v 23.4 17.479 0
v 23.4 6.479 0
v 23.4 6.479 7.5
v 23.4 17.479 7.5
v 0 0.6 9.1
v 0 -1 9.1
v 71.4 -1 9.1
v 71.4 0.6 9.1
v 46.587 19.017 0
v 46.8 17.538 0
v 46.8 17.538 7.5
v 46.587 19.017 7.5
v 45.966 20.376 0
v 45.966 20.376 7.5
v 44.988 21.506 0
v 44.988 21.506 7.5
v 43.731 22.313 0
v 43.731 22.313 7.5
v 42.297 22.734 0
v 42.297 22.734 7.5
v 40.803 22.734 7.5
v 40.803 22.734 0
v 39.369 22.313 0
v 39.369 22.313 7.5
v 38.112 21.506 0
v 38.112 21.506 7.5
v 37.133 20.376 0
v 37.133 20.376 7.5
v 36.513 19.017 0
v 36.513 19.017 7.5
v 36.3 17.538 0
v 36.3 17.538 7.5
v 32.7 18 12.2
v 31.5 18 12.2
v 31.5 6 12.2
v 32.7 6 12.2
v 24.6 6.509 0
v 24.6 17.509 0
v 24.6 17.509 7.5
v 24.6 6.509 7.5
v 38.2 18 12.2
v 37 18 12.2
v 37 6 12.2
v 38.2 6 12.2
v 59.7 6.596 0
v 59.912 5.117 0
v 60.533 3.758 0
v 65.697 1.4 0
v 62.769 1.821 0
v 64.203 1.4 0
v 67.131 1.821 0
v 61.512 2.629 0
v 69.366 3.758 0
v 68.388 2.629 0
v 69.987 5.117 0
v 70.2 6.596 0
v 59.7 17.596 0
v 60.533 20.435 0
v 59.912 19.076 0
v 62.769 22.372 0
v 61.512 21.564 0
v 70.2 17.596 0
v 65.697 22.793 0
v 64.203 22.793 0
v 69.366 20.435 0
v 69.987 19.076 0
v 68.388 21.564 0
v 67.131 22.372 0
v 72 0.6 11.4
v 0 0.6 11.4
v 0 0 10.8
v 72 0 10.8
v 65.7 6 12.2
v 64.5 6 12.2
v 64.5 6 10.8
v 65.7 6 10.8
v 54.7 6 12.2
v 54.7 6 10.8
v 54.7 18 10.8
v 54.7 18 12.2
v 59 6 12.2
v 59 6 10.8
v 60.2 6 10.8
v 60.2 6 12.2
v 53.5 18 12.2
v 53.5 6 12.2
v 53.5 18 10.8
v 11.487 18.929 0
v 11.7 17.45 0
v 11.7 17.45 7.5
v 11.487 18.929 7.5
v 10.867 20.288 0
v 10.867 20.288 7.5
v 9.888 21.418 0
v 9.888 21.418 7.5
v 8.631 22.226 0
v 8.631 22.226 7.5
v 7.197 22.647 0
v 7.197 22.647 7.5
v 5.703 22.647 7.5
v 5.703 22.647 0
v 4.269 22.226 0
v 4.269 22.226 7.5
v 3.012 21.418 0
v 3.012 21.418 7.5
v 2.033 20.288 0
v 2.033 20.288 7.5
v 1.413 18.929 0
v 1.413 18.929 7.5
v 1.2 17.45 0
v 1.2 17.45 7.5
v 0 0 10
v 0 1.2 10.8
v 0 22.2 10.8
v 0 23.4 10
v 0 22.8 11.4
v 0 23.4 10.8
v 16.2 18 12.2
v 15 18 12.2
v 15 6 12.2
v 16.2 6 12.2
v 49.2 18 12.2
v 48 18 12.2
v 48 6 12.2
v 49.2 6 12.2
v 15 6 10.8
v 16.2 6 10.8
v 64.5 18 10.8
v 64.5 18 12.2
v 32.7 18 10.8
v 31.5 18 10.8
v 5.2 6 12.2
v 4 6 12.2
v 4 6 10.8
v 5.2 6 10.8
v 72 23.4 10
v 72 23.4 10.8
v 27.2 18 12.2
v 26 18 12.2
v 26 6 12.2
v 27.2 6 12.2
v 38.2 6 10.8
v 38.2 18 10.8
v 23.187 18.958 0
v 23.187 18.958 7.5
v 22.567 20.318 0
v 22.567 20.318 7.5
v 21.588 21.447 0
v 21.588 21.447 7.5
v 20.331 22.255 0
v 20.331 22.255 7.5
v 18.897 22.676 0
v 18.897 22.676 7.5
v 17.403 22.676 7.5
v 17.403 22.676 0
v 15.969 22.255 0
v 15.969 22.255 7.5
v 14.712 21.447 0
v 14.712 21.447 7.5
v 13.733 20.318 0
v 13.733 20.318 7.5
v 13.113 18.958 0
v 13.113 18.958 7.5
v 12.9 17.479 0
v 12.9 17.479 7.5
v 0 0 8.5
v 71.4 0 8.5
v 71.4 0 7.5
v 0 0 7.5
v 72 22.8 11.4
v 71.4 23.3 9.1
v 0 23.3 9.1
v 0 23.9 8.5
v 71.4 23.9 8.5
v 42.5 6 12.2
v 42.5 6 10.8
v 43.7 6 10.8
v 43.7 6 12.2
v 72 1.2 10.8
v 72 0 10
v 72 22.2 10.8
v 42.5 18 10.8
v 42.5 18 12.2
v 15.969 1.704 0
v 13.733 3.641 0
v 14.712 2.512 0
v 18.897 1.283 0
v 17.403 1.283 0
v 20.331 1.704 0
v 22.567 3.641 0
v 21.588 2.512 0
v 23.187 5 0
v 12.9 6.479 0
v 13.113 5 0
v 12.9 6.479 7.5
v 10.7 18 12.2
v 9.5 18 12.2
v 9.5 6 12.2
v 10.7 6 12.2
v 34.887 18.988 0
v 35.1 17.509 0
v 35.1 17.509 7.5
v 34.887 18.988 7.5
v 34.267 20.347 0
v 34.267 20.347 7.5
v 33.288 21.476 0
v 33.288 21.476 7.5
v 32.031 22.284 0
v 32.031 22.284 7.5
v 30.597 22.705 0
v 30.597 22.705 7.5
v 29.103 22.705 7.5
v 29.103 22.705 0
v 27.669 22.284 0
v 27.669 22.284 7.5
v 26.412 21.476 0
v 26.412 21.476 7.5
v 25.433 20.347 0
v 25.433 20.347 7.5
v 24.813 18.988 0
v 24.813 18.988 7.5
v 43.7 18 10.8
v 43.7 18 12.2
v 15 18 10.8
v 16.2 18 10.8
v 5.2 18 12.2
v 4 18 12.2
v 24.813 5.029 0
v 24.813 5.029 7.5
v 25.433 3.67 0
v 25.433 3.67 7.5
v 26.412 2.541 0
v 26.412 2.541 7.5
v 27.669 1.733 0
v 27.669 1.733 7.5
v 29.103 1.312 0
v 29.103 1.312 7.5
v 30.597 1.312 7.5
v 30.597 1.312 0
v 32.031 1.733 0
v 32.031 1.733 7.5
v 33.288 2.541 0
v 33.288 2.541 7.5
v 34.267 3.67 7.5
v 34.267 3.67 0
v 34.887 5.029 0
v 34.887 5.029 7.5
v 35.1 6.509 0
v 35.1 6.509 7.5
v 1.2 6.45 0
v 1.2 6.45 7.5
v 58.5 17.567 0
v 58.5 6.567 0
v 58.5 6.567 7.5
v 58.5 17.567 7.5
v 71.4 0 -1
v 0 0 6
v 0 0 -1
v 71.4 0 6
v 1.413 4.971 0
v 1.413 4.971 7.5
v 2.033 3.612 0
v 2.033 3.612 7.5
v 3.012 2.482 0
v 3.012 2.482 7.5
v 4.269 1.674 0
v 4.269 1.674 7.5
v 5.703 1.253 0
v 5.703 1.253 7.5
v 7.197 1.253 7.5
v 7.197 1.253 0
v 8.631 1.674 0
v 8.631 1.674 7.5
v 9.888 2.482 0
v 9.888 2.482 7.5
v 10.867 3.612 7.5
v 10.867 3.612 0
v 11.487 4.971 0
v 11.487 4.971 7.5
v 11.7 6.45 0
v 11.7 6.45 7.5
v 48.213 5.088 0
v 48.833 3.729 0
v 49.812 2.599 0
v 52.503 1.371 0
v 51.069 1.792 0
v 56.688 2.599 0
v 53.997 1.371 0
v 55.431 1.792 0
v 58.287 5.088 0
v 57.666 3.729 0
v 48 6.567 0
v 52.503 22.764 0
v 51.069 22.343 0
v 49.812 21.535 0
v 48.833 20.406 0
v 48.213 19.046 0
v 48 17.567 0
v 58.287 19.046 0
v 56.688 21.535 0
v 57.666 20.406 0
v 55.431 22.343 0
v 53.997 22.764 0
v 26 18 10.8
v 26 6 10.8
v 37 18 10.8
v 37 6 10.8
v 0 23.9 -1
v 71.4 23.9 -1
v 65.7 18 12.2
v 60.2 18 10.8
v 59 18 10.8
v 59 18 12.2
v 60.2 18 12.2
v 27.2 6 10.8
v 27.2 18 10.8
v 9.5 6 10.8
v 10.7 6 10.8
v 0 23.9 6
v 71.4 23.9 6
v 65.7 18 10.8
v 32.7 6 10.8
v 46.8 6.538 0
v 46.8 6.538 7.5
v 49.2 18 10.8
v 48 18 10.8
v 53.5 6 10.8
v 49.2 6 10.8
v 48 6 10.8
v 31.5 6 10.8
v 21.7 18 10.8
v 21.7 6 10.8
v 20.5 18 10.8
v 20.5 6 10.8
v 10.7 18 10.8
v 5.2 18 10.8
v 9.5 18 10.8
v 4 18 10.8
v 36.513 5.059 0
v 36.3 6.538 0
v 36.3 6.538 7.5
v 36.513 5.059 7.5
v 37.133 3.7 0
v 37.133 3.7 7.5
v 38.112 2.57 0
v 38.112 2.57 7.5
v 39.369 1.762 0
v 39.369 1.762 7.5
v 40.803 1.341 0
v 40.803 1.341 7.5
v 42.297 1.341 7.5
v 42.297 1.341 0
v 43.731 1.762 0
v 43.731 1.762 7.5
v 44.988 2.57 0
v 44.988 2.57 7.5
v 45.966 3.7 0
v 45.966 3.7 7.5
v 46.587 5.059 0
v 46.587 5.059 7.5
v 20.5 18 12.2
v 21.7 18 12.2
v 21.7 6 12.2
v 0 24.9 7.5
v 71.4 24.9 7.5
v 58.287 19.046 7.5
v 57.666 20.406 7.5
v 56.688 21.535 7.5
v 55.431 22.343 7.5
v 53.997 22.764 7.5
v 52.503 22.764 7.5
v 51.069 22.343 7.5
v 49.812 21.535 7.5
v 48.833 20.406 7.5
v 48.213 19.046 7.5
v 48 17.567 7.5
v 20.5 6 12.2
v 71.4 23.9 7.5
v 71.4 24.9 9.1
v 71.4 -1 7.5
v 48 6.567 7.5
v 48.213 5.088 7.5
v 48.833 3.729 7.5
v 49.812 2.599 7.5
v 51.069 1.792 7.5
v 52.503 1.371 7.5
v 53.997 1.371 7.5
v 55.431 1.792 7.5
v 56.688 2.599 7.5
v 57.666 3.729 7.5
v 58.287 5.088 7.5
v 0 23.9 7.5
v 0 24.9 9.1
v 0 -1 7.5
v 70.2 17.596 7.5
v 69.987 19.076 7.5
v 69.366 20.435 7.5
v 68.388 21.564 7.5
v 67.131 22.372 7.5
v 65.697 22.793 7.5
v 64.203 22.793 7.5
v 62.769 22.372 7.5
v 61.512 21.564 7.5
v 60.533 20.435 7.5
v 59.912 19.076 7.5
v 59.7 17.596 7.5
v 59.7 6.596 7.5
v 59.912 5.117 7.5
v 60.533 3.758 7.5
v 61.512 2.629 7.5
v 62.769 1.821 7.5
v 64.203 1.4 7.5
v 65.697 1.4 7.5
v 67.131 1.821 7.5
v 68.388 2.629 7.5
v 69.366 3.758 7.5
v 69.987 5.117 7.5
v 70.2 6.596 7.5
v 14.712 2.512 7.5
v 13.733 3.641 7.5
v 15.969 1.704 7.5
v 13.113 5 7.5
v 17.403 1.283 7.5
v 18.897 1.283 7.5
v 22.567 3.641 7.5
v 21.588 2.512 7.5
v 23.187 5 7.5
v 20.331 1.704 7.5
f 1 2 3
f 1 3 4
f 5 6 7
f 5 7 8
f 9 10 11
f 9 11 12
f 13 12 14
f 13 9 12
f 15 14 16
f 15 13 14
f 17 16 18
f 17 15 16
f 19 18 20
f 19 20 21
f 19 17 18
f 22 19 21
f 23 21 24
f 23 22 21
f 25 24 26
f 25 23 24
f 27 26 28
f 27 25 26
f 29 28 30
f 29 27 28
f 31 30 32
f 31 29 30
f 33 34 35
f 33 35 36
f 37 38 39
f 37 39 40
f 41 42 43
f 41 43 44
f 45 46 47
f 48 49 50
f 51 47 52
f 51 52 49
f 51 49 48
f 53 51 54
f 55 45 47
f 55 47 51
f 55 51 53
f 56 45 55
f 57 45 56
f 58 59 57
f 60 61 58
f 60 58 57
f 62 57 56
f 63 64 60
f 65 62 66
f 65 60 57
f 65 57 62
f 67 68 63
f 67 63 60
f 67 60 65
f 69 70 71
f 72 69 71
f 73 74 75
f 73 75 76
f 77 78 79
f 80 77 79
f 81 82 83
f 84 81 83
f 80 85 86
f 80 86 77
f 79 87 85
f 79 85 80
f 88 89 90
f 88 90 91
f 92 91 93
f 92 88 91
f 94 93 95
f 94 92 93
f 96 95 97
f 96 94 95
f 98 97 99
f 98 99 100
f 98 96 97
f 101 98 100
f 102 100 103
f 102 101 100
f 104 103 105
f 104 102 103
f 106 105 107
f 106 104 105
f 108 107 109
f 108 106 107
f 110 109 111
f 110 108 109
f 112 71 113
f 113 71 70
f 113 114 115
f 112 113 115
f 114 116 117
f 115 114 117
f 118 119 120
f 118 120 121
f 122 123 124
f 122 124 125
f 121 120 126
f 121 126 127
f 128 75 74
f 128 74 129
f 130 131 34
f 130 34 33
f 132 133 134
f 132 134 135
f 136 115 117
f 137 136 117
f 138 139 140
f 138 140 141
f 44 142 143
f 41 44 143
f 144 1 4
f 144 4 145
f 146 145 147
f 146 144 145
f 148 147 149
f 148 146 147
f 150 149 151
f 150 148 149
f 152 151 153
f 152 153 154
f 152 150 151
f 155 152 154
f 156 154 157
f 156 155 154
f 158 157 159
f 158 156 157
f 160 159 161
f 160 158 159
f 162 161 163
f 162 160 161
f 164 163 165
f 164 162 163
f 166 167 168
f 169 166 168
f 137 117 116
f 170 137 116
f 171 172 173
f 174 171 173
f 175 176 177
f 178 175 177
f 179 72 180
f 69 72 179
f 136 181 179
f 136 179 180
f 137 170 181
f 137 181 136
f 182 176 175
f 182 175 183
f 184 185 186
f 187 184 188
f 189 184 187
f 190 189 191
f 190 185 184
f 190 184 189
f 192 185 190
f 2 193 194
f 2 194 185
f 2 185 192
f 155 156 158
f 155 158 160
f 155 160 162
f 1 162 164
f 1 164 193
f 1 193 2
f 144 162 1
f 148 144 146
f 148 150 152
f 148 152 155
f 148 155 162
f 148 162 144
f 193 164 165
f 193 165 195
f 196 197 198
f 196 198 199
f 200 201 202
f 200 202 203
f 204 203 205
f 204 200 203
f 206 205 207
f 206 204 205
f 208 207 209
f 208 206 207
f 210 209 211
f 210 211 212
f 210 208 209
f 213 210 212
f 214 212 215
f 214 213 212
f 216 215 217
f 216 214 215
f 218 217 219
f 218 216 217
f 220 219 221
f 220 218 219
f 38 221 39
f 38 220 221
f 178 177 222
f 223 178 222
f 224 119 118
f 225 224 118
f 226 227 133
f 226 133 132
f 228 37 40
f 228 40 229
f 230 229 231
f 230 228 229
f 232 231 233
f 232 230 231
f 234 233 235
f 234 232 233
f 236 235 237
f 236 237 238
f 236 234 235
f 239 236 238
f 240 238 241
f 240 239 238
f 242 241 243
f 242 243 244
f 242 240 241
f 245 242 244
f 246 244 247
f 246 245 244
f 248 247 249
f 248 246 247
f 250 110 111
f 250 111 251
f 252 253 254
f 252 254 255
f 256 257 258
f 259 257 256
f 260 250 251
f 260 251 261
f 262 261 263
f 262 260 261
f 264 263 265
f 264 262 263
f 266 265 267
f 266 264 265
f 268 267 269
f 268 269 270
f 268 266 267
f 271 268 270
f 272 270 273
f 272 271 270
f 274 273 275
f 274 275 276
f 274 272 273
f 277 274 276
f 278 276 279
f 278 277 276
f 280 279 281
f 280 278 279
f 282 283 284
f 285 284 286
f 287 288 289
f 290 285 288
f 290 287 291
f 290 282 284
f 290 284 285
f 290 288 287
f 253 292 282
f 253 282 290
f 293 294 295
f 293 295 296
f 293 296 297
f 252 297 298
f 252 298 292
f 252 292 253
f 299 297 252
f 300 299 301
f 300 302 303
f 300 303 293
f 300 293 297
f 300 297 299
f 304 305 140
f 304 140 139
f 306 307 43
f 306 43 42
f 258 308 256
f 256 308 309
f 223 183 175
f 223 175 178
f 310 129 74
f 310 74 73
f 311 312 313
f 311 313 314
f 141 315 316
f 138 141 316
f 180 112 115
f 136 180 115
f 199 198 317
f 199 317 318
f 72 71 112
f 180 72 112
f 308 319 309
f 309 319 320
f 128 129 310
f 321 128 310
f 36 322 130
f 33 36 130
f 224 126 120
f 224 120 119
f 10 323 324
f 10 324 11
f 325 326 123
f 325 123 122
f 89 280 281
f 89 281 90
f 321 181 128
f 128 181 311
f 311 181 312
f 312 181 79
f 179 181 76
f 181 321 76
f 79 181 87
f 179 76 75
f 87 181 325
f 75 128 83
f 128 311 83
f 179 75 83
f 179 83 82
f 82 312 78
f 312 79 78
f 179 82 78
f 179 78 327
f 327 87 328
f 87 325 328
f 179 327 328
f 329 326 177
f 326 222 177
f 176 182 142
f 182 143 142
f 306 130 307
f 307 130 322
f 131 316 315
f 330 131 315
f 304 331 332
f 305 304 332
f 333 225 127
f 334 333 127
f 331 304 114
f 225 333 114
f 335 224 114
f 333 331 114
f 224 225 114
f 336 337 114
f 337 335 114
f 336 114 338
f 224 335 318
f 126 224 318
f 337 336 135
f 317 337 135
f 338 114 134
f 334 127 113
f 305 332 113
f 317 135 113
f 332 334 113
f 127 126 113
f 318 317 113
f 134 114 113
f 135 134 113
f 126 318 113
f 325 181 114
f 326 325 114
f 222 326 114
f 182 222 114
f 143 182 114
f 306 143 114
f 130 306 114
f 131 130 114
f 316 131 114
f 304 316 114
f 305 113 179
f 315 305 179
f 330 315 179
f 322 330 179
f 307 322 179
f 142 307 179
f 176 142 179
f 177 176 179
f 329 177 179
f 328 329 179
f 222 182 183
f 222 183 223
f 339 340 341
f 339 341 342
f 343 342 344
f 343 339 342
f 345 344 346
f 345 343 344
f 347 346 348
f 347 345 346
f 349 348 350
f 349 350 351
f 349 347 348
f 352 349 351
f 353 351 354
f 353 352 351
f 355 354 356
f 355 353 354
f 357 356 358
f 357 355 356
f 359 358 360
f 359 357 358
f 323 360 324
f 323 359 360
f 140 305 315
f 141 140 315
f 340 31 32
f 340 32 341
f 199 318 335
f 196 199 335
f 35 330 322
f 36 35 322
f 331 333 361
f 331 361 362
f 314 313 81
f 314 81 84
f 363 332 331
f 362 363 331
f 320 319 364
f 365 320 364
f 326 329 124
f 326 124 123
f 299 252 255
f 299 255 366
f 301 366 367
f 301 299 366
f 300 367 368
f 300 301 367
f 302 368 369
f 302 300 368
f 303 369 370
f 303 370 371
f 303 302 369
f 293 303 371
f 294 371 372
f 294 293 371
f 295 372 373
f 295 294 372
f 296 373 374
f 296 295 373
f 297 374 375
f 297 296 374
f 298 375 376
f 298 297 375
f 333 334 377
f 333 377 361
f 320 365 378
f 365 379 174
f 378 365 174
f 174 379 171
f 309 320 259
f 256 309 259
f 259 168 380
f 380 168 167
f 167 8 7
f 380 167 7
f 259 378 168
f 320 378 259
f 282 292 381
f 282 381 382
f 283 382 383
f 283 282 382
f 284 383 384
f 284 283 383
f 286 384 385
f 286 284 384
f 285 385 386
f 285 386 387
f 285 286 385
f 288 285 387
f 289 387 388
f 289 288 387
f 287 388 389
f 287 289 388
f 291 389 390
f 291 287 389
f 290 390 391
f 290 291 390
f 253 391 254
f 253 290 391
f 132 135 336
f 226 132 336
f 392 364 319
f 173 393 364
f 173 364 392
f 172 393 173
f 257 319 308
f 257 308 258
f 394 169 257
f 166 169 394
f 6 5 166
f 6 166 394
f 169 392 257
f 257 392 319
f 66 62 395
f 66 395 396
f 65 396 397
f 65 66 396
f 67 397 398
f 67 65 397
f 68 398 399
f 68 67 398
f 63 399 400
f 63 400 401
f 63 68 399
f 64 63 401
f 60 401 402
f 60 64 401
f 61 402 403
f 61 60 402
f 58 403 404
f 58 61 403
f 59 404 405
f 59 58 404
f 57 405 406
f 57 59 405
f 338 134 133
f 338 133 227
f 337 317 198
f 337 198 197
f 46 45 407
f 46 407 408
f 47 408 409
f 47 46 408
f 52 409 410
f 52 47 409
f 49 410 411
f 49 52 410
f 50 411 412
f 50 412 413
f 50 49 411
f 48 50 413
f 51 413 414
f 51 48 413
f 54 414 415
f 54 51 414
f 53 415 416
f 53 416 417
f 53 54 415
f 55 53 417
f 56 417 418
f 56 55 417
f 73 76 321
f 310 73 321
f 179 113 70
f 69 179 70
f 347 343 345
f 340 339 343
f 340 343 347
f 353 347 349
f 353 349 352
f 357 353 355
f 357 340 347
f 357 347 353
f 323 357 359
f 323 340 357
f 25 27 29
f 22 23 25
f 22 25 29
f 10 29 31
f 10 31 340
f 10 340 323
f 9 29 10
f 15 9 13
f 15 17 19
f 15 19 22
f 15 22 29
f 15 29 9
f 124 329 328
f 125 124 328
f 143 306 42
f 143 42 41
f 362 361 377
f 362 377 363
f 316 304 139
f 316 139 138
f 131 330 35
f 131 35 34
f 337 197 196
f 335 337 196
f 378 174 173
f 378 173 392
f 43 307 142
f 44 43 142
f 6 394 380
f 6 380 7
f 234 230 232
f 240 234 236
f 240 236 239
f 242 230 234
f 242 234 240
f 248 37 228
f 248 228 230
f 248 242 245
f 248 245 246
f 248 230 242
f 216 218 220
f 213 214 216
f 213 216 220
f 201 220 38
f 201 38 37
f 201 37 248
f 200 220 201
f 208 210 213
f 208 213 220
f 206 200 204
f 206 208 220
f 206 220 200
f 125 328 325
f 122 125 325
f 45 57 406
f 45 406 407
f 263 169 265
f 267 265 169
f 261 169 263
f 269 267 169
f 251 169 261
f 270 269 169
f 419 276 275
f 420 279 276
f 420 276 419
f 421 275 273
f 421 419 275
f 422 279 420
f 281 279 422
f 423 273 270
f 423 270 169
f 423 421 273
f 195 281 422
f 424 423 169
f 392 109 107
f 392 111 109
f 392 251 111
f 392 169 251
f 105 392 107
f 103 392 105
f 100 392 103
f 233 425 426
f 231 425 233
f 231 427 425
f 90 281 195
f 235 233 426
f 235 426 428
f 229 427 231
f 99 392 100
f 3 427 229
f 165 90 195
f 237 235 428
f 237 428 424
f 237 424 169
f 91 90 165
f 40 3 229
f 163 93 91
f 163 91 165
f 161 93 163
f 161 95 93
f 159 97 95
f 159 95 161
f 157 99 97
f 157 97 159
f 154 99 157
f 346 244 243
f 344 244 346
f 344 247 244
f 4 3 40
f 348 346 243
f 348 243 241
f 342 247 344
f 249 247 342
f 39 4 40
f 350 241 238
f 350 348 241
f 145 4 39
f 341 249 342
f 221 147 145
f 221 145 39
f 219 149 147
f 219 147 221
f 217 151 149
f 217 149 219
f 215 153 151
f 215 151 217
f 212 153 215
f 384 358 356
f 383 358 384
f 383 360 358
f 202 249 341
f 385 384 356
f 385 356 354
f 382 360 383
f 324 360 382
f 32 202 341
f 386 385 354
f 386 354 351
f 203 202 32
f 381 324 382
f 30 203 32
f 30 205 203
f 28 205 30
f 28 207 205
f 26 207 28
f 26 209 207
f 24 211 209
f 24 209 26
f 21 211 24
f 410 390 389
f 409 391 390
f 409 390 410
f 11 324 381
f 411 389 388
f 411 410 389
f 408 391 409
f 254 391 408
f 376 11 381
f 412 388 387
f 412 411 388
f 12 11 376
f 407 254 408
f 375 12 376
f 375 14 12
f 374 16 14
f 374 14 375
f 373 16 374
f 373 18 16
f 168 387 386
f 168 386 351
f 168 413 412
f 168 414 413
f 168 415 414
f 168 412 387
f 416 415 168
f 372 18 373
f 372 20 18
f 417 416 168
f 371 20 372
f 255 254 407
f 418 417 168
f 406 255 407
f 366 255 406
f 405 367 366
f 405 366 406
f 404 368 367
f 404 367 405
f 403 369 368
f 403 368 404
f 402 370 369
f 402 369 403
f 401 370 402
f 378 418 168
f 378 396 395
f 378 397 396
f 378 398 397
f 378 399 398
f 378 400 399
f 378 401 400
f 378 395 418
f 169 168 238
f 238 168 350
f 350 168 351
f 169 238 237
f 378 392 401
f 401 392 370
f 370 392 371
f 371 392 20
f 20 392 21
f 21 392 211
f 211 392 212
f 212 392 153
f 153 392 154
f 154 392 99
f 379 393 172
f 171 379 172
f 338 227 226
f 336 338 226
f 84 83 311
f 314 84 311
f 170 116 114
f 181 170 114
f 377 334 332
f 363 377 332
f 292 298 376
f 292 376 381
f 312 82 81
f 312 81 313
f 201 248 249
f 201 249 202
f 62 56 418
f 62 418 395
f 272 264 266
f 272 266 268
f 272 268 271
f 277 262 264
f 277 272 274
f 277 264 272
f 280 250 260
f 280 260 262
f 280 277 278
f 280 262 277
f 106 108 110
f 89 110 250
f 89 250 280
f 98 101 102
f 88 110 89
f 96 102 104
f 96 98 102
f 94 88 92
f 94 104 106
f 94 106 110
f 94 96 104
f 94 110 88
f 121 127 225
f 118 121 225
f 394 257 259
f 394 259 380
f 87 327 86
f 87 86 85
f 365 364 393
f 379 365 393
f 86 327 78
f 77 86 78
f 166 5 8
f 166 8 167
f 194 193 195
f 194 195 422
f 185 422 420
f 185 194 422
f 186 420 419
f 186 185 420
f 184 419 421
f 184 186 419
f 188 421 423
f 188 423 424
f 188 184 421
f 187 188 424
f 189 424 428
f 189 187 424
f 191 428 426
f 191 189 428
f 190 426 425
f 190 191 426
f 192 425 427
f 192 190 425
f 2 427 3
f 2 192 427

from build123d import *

# Parameters (mm, degrees)
SKETCH_W     = 71.4
SKETCH_H     = 23.9
PAD_DEPTH    = 7.5
SKETCH001_W  = 71.4
SKETCH001_H  = 23.9
PAD001_DEPTH = 1
PAD002_DEPTH = 71.4
PAD003_DEPTH = 72
SKETCH004_W  = 1.2
SKETCH004_H  = 12
PAD004_DEPTH = 1.4


with BuildPart() as tarto:
    # Sketch → Pad (new body)
    with BuildSketch(Plane.XY):
        with Locations((35.7, 11.95)):
            Rectangle(SKETCH_W, SKETCH_H)
        with BuildLine():
            ThreePointArc((11.7, 17.45), (6.45, 22.7), (1.2, 17.45))
            Line((1.2, 17.45), (1.2, 6.45))
            ThreePointArc((1.2, 6.45), (6.45, 1.2), (11.7, 6.45))
            Line((11.7, 6.45), (11.7, 17.45))
        make_face(mode=Mode.SUBTRACT)
        with BuildLine():
            ThreePointArc((23.399963, 17.479296), (18.149963, 22.729296), (12.899963, 17.479296))
            Line((12.899963, 17.479296), (12.899963, 6.479296))
            ThreePointArc((12.899963, 6.479296), (18.149963, 1.229296), (23.399963, 6.479296))
            Line((23.399963, 6.479296), (23.399963, 17.479296))
        make_face(mode=Mode.SUBTRACT)
        with BuildLine():
            ThreePointArc((35.099927, 17.508591), (29.849927, 22.758591), (24.599927, 17.508591))
            Line((24.599927, 17.508591), (24.599927, 6.508591))
            ThreePointArc((24.599927, 6.508591), (29.849927, 1.258591), (35.099927, 6.508591))
            Line((35.099927, 6.508591), (35.099927, 17.508591))
        make_face(mode=Mode.SUBTRACT)
        with BuildLine():
            ThreePointArc((46.79989, 17.537887), (41.54989, 22.787887), (36.29989, 17.537887))
            Line((36.29989, 17.537887), (36.29989, 6.537887))
            ThreePointArc((36.29989, 6.537887), (41.54989, 1.287887), (46.79989, 6.537887))
            Line((46.79989, 6.537887), (46.79989, 17.537887))
        make_face(mode=Mode.SUBTRACT)
        with BuildLine():
            ThreePointArc((58.499853, 17.567183), (53.249853, 22.817183), (47.999853, 17.567183))
            Line((47.999853, 17.567183), (47.999853, 6.567183))
            ThreePointArc((47.999853, 6.567183), (53.249853, 1.317183), (58.499853, 6.567183))
            Line((58.499853, 6.567183), (58.499853, 17.567183))
        make_face(mode=Mode.SUBTRACT)
        with BuildLine():
            ThreePointArc((70.199817, 17.596479), (64.949817, 22.846479), (59.699817, 17.596479))
            Line((59.699817, 17.596479), (59.699817, 6.596479))
            ThreePointArc((59.699817, 6.596479), (64.949817, 1.346479), (70.199817, 6.596479))
            Line((70.199817, 6.596479), (70.199817, 17.596479))
        make_face(mode=Mode.SUBTRACT)
    extrude(amount=PAD_DEPTH)

    # Sketch001 → Pad001 (join)
    with BuildSketch(Plane.XY):
        with Locations((35.7, 11.95)):
            Rectangle(SKETCH001_W, SKETCH001_H)
    extrude(amount=-PAD001_DEPTH)

    # Sketch002 → Pad002 (join)
    with BuildSketch(Plane.YZ):
        Polygon((0, 6), (-1, 7.5), (-1, 9.1), (0.6, 9.1), (0, 8.5), align=None)
        Polygon((23.9, 6), (24.9, 7.5), (24.9, 9.1), (23.3, 9.1), (23.9, 8.5), align=None)
    extrude(amount=PAD002_DEPTH)


with BuildPart() as fedel:
    # Sketch003 → Pad003 (new body)
    with BuildSketch(Plane.YZ):
        Polygon((0, 10), (23.4, 10), (23.4, 10.8), (22.8, 11.4), (22.2, 10.8), (1.2, 10.8), (0.6, 11.4), (0, 10.8), align=None)
    extrude(amount=PAD003_DEPTH)

    # Sketch004 → Pad004 (join)
    with BuildSketch(Plane.XY.offset(10.8)):
        with Locations((4.6, 12)):
            Rectangle(SKETCH004_W, SKETCH004_H)
        with Locations((10.1, 12)):
            Rectangle(SKETCH004_W, SKETCH004_H)
        with Locations((15.6, 12)):
            Rectangle(SKETCH004_W, SKETCH004_H)
        with Locations((21.1, 12)):
            Rectangle(SKETCH004_W, SKETCH004_H)
        with Locations((26.6, 12)):
            Rectangle(SKETCH004_W, SKETCH004_H)
        with Locations((32.1, 12)):
            Rectangle(SKETCH004_W, SKETCH004_H)
        with Locations((37.6, 12)):
            Rectangle(SKETCH004_W, SKETCH004_H)
        with Locations((43.1, 12)):
            Rectangle(SKETCH004_W, SKETCH004_H)
        with Locations((48.6, 12)):
            Rectangle(SKETCH004_W, SKETCH004_H)
        with Locations((54.1, 12)):
            Rectangle(SKETCH004_W, SKETCH004_H)
        with Locations((59.6, 12)):
            Rectangle(SKETCH004_W, SKETCH004_H)
        with Locations((65.1, 12)):
            Rectangle(SKETCH004_W, SKETCH004_H)
    extrude(amount=PAD004_DEPTH)


solid = Compound([tarto.part, fedel.part])
